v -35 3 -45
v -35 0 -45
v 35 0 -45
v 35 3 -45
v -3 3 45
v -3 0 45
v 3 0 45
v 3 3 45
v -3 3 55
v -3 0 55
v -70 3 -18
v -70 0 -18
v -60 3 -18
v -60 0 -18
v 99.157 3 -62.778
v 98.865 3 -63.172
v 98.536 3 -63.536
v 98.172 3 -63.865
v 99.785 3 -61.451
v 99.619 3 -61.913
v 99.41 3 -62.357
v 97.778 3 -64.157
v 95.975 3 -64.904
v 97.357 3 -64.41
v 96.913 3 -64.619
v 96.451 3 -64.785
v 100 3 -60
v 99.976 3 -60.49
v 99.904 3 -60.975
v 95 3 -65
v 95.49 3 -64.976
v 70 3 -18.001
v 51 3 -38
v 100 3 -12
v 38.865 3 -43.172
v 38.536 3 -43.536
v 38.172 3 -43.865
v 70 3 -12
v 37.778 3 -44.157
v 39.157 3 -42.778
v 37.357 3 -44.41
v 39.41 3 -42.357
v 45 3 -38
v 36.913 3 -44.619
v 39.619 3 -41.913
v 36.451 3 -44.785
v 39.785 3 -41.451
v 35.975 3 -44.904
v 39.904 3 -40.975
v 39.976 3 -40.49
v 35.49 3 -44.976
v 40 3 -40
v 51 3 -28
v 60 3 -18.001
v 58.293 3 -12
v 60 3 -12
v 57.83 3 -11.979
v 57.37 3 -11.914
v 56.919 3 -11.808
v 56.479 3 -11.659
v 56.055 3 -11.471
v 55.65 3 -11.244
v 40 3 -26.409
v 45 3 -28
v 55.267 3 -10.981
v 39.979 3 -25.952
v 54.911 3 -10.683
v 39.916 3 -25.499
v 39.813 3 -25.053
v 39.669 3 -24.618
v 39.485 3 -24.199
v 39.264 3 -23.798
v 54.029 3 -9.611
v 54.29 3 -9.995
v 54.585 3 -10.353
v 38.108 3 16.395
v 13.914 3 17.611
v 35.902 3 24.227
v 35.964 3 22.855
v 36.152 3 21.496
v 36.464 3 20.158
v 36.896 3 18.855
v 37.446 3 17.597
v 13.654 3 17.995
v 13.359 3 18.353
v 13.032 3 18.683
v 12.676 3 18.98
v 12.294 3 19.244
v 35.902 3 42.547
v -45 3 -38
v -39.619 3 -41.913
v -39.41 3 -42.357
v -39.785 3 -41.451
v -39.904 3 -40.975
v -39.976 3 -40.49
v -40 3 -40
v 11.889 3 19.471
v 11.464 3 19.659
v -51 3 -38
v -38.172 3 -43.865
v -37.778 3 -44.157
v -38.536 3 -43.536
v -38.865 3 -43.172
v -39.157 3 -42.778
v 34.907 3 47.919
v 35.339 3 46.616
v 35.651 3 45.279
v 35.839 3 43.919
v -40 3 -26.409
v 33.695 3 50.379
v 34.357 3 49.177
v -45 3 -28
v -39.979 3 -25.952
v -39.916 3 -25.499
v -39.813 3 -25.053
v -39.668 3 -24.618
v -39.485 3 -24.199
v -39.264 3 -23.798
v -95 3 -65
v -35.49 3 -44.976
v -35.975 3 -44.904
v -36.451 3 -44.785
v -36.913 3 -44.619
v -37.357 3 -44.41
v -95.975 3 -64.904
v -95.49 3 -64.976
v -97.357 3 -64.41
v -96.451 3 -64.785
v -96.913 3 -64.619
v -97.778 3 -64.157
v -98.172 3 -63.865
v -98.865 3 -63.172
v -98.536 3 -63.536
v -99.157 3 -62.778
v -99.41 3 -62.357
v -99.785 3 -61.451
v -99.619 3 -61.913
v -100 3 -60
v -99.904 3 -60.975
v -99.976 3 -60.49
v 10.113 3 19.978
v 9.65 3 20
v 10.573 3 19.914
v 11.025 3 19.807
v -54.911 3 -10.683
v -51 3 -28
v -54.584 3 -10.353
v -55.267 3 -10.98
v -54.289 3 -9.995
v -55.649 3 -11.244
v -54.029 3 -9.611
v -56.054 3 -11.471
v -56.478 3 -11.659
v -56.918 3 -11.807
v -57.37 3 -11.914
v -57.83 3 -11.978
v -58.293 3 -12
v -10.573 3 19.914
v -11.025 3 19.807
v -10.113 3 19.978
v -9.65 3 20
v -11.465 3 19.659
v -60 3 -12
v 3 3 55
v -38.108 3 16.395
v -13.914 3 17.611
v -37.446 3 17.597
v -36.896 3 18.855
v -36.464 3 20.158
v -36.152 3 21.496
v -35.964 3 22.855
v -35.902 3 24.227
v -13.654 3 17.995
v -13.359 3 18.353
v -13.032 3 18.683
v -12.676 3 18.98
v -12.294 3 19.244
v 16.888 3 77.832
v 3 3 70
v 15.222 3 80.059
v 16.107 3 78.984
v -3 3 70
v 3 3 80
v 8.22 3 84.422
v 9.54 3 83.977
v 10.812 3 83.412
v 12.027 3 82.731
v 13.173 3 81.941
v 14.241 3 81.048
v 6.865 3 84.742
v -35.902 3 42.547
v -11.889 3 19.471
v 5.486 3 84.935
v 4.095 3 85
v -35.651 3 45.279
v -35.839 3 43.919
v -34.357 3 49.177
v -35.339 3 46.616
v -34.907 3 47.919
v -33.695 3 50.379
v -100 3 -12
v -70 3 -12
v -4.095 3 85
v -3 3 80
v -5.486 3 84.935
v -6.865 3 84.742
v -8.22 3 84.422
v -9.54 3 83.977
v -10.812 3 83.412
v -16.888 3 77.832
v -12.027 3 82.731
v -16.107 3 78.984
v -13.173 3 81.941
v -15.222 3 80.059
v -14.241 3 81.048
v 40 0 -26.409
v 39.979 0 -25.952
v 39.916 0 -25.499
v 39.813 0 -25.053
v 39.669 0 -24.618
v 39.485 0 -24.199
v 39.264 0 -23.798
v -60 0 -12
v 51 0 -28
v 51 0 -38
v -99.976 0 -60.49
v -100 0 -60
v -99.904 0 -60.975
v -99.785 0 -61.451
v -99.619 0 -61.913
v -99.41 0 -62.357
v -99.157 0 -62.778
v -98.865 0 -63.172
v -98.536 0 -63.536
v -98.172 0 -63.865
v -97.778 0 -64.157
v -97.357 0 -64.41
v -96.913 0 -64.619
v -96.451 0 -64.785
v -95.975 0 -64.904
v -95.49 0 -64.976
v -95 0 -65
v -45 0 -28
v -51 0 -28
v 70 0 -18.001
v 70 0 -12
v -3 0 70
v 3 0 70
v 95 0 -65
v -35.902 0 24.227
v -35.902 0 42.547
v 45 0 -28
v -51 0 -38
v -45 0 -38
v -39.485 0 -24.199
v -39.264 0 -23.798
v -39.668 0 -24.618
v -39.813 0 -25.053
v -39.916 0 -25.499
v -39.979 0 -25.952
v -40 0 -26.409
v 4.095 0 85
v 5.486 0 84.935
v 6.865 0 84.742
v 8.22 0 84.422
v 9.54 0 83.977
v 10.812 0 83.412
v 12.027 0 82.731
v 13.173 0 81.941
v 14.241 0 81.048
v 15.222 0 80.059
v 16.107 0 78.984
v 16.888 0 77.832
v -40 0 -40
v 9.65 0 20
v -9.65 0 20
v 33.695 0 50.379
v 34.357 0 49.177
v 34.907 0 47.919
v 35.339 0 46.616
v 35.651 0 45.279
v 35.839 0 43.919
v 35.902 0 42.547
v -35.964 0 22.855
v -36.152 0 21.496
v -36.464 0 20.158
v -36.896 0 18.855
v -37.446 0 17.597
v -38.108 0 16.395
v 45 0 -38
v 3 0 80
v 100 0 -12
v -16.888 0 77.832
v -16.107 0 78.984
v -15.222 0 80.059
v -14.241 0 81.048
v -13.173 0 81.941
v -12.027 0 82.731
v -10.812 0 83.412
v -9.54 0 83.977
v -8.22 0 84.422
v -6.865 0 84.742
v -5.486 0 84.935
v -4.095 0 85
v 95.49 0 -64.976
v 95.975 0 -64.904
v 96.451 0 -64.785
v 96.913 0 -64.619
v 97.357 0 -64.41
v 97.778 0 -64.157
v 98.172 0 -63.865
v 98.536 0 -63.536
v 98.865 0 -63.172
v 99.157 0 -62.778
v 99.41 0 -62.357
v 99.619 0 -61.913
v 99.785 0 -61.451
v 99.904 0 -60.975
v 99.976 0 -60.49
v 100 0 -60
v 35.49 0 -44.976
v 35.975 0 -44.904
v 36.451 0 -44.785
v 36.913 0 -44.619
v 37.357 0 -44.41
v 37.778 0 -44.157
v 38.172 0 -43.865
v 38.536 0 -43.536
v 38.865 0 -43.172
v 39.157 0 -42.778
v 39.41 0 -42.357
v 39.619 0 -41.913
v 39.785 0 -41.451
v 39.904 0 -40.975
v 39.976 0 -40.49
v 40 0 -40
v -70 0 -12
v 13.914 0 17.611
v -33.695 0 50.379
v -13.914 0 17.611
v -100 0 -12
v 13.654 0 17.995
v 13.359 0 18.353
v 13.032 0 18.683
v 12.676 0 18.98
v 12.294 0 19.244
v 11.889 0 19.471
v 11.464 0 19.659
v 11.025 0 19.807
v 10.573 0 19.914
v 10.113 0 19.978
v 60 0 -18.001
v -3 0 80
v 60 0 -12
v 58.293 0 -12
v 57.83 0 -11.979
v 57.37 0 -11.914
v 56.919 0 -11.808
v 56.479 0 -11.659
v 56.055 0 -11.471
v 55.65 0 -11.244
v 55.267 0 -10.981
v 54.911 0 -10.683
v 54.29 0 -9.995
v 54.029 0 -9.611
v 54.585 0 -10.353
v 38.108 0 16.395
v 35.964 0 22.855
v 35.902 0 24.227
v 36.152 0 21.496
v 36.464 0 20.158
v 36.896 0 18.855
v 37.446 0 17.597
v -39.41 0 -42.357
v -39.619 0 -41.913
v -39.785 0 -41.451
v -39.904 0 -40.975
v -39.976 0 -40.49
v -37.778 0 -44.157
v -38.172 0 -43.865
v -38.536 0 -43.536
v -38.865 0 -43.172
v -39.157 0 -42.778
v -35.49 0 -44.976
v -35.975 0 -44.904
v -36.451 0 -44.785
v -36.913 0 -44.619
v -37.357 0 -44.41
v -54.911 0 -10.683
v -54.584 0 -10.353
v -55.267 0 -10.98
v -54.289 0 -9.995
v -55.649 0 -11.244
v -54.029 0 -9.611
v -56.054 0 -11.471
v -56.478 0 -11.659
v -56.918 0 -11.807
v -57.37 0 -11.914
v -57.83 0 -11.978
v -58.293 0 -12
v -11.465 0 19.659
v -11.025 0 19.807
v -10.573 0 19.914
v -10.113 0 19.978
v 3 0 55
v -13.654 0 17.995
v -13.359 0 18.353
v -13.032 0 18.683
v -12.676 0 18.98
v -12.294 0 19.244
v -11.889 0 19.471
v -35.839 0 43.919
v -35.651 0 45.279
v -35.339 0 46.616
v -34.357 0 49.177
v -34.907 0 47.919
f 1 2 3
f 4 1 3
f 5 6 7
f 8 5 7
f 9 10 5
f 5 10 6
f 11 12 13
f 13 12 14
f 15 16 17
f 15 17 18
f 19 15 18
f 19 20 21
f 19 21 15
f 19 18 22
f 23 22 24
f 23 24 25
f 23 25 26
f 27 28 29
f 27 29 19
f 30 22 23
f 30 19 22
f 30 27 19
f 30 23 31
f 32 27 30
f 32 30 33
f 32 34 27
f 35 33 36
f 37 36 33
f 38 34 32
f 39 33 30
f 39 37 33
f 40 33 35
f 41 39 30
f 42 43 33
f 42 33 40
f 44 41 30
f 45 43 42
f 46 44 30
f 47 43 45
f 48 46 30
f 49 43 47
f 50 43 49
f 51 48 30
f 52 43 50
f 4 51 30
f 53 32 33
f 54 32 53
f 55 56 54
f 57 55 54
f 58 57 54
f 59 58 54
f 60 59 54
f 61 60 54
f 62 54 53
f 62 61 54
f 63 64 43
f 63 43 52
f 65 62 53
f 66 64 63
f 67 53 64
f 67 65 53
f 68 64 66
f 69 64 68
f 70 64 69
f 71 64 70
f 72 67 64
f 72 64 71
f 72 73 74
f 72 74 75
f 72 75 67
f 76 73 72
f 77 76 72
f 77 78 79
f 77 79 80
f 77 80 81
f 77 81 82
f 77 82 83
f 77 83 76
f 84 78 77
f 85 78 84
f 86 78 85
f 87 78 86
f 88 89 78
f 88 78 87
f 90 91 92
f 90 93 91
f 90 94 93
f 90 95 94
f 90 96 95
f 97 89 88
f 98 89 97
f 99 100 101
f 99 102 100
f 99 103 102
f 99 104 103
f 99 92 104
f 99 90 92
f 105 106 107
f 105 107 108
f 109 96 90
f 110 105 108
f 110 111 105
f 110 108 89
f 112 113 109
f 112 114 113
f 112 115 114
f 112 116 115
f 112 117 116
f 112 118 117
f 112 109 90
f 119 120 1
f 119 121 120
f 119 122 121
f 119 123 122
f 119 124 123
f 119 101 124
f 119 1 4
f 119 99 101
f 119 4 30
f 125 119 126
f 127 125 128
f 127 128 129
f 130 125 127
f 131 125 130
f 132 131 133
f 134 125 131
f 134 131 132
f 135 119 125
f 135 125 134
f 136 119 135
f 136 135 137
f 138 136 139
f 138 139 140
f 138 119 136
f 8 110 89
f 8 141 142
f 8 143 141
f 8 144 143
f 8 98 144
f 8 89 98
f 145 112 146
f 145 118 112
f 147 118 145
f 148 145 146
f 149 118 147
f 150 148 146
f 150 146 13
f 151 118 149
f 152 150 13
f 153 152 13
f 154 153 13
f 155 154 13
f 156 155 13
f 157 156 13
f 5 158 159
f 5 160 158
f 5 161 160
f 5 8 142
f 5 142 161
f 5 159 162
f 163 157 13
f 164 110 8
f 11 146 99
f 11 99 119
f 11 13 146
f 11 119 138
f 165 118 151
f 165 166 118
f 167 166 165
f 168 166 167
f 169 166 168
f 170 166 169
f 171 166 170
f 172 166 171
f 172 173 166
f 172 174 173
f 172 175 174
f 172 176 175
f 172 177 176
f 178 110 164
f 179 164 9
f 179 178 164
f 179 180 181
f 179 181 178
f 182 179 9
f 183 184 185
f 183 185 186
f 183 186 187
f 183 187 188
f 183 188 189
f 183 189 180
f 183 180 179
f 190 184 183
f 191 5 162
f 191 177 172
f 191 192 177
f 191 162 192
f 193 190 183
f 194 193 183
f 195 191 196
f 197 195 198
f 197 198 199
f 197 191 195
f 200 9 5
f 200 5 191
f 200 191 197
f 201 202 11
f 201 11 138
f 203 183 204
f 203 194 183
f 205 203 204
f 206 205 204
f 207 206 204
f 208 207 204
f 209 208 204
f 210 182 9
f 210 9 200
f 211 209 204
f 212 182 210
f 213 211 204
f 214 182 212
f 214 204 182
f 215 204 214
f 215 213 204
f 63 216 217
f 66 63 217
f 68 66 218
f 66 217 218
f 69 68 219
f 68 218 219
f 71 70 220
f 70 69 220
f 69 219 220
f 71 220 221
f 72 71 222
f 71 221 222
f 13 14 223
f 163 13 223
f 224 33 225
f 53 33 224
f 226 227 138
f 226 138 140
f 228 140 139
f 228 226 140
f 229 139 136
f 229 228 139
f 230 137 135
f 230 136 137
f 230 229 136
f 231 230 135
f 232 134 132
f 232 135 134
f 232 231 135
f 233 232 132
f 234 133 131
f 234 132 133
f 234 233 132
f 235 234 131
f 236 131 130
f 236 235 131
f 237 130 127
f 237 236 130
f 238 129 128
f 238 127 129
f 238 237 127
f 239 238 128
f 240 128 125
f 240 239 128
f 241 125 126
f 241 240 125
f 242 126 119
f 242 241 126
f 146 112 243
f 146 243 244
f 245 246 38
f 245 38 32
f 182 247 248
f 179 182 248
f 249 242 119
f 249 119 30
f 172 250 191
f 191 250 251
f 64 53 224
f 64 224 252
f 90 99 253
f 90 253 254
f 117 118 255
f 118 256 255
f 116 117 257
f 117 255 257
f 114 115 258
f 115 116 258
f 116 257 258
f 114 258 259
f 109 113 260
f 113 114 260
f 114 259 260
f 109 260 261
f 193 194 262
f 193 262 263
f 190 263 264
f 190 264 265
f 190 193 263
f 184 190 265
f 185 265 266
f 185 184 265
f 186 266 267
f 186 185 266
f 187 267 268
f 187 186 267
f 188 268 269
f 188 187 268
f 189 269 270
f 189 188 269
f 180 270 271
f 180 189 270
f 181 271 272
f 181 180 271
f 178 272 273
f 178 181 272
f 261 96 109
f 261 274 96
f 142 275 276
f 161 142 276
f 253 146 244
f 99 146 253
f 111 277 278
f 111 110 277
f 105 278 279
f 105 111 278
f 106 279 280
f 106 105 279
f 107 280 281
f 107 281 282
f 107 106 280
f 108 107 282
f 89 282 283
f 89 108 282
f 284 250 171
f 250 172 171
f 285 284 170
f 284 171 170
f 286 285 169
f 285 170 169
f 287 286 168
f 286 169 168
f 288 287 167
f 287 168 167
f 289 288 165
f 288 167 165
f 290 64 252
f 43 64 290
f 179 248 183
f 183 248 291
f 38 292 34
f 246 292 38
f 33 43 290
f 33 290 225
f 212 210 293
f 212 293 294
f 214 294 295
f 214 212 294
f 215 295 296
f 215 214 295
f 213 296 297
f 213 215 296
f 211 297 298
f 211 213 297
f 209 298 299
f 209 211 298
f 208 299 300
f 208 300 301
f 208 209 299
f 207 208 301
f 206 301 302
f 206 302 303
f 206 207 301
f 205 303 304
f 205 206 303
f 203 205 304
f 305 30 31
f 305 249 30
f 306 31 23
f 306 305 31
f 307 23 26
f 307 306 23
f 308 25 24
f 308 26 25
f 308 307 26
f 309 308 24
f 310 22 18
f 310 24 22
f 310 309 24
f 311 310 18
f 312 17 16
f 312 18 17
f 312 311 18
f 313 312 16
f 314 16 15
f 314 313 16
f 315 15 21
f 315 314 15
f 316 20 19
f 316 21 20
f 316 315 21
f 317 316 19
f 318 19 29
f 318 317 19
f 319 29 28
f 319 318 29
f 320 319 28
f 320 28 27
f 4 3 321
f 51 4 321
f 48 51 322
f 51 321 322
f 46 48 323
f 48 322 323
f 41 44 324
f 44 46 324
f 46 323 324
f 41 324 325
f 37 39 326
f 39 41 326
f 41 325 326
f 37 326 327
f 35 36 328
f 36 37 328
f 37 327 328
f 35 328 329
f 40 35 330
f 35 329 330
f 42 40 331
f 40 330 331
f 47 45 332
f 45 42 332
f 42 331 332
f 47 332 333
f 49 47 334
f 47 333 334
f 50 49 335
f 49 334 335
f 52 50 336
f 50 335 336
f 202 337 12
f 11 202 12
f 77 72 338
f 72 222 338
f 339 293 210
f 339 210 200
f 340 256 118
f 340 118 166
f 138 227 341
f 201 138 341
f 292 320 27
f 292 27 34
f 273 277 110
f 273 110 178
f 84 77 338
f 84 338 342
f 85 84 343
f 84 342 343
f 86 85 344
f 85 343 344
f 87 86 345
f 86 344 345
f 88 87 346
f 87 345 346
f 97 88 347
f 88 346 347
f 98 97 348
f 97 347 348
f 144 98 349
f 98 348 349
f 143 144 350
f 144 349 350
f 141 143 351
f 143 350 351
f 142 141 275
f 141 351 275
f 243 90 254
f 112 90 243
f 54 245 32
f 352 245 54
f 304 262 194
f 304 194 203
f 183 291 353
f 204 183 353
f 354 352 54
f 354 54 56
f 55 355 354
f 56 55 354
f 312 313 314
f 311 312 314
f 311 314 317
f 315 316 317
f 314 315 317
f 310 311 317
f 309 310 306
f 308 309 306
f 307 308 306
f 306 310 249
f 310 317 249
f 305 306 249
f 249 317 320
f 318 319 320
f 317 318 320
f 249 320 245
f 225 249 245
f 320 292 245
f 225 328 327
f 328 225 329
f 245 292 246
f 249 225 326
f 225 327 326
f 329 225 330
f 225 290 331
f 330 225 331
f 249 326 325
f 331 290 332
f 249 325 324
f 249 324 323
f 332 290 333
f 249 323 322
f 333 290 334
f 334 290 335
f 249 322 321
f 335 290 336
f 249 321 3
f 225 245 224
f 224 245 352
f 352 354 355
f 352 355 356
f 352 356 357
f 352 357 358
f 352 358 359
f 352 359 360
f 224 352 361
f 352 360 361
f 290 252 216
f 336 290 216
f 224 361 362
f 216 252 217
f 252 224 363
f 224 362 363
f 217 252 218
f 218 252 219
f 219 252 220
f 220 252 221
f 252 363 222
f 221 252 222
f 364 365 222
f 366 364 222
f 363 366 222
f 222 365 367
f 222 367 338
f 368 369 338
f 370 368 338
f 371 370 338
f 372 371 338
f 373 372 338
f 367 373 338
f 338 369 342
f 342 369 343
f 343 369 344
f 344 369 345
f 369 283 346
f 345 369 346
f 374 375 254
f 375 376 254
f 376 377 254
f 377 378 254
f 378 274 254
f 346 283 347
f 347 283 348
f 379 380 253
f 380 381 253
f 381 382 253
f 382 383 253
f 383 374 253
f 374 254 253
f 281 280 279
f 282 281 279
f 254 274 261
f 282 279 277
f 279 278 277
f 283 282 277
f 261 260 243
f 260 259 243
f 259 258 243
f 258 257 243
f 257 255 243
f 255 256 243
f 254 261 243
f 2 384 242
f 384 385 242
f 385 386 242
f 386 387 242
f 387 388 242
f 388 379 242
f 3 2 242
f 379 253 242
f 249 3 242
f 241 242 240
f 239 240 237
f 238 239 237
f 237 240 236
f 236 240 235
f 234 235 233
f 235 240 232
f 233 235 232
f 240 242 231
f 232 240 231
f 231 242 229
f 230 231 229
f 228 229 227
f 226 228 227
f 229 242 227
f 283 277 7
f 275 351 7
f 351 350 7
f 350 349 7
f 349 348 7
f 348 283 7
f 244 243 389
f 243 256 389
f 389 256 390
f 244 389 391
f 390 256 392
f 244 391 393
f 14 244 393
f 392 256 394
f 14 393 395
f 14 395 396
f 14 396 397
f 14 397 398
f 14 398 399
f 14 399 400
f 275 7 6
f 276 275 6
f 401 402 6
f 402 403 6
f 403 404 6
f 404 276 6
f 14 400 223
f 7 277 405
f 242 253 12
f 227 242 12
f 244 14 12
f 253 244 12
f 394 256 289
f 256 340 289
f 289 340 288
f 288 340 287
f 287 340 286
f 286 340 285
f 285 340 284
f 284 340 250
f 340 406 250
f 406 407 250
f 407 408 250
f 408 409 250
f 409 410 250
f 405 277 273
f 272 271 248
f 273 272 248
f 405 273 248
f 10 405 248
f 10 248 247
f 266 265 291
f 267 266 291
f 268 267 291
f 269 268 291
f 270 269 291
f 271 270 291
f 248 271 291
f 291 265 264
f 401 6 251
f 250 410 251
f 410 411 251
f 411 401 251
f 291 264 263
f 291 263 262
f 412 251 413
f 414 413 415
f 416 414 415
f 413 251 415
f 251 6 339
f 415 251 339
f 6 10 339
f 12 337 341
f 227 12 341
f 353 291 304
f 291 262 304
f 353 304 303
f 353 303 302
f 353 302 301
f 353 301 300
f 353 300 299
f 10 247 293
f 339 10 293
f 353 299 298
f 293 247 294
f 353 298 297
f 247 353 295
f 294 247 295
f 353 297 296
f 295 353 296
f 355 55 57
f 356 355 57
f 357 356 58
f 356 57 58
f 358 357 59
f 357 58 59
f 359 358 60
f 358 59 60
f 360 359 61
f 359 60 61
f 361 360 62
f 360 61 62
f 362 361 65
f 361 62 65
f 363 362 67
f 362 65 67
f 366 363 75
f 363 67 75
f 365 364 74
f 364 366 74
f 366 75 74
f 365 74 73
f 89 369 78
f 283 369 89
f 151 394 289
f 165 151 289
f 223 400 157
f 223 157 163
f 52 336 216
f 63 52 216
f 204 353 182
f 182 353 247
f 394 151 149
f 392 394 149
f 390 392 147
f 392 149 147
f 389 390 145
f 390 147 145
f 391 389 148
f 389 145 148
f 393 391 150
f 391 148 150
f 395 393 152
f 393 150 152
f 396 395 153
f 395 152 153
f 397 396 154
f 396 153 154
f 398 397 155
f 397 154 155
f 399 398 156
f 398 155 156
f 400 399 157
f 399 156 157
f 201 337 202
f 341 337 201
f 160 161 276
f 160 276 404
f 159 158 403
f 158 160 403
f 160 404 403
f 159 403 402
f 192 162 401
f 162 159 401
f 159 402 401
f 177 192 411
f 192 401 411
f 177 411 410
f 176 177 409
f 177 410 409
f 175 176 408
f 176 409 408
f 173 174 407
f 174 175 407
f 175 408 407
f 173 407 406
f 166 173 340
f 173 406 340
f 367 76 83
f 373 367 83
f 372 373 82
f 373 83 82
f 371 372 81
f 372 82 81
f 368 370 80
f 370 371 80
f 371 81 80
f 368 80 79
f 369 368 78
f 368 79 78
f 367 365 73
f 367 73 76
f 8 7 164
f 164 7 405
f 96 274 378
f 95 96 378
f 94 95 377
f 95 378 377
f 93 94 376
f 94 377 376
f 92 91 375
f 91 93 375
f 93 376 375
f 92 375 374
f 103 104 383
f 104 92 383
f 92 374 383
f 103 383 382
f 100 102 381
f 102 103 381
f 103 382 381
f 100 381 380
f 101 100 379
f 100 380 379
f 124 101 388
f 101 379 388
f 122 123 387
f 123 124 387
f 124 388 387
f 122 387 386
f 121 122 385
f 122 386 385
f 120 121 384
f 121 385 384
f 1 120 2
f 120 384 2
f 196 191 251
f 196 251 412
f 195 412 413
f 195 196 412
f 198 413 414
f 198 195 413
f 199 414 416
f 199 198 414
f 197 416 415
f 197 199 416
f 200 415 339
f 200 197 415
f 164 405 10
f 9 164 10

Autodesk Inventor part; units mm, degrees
ref_plane "YZ Plane" through (0, 0, 0) normal (1, 0, 0) x (0, 1, 0)
ref_plane "XZ Plane" through (0, 0, 0) normal (0, 1, 0) x (-1, 0, 0)
ref_plane "XY Plane" through (0, 0, 0) normal (0, 0, 1) x (1, 0, 0)
sketch "Sketch2" plane through (0, 0, 0) normal (0, 1, 0) x (-1, 0, 0)
  line L0 (70, -18) -> (60, -18)
  line L1 (60, -18) -> (60, -12)
  line L2 (70, -12) -> (70, -18)
  line L3 (-70, -18.0006) -> (-60, -18.0006)
  line L4 (-60, -18.0006) -> (-60, -12.0003)
  line L5 (-70, -12.0003) -> (-70, -18.0006)
  line L6 (3, 70) -> (-3, 70)
  line L7 (-3, 70) -> (-3, 80)
  line L8 (-3, 80) -> (3, 80)
  line L9 (3, 80) -> (3, 70)
  line L10 (3, 45) -> (-3, 45)
  line L11 (-3, 45) -> (-3, 55)
  line L12 (-3, 55) -> (3, 55)
  line L13 (3, 55) -> (3, 45)
  line L14 (95, -65) -> (-95, -65)
  line L15 (-12.5, 85) -> (12.5, 85)
  line L16 (12.5, 85) -> (35.9015, 46.7742)
  line L17 (-100, -12.0003) -> (-70, -12.0003)
  line L18 (-55.4919, -12.0003) -> (-60, -12.0003)
  line L19 (55.4917, -12) -> (60, -12)
  line L20 (70, -12) -> (100, -12)
  line L21 (-100, -60) -> (-100, -12.0003)
  line L22 (100, -60) -> (100, -12)
  line L23 (35, -45) -> (-35, -45)
  line L24 (-40, -40) -> (-40, -26.409)
  line L25 (-39.2644, -23.7983) -> (-13.9141, 17.6106)
  line L26 (-9.6497, 20) -> (9.6497, 20)
  line L27 (40, -40) -> (40, -26.409)
  line L28 (39.2644, -23.7983) -> (13.9141, 17.6106)
  arc A0 (-40, -40) -> (-35, -45) centre (-35, -40) ccw
  arc A1 (-39.2644, -23.7983) -> (-40, -26.409) centre (-35, -26.409) ccw
  arc A2 (-9.6497, 20) -> (-13.9141, 17.6106) centre (-9.6497, 15) ccw
  arc A3 (13.9141, 17.6106) -> (9.6497, 20) centre (9.6497, 15) ccw
  arc A4 (40, -26.409) -> (39.2644, -23.7983) centre (35, -26.409) ccw
  arc A5 (35, -45) -> (40, -40) centre (35, -40) ccw
  line L29 (55.4917, -12) -> (35.9015, 20)
  line L30 (35.9015, 20) -> (35.9015, 46.7742)
  line L31 (-55.4919, -12.0003) -> (-35.9015, 20)
  line L32 (-35.9015, 20) -> (-35.9015, 46.7742)
  line L33 (-35.9015, 46.7742) -> (-12.5, 85)
  line L34 (0, -65) -> (0, 85) construction
  arc A6 (95, -65) -> (100, -60) centre (95, -60) ccw
  arc A7 (-100, -60) -> (-95, -65) centre (-95, -60) ccw
  point P0 (100, -65)
  point P1 (-100, -65)
  point P2 (0, 0)
  point P3 (0, 80)
  point P4 (0, 45)
  point P5 (0, 55)
  point P6 (0, 0)
  point P7 (0, 0)
  point P8 (-70, -15.4178)
  point P9 (75.3708, -12)
  point P10 (0, 0)
  point P11 (-40, -45)
  point P12 (40, -45)
  point P13 (-40, -25)
  point P14 (-12.4513, 20)
  point P15 (12.4513, 20)
  point P16 (40, -25)
  point P17 (0, 20)
  point P18 (0, -45)
  dimension "d65" = 200
  dimension "d115" = 10
  dimension "d116" = 6
  dimension "d118" = 10
  dimension "d119" = 6
  dimension "d120" = 15
  dimension "d147" = 65
  dimension "d173" = 25
  dimension "d187" = 100
  dimension "d191" = 30
  dimension "d192" = 30
  dimension "d194" = 6.0003
  dimension "d195" = 6
  dimension "d196" = 10
  dimension "d197" = 10
  dimension "d198" = 52.9997
  dimension "d199" = 53
  dimension "d204" = 150
  dimension "d213" = 20
  dimension "d214" = 20
  dimension "d218" = 65
  dimension "d219" = 40
  dimension "d220" = 5
  dimension "d233" = 148.525
  dimension "d235" = 5
  dimension "d236" = 20
  dimension "d249" = 5
extrude "Extrusion11" add sketch "Sketch2" along normal blind 3
sketch "Sketch4" plane through (0, 3, 0) normal (0, 1, 0) x (1, 0, 0)
  line L0 (-51, 38) -> (-45, 38)
  line L1 (-45, 38) -> (-45, 28)
  line L2 (-45, 28) -> (-51, 28)
  line L3 (-51, 28) -> (-51, 38)
  line L4 (95, 65) -> (-95, 65) projected
  line L5 (-40, 40) -> (-40, 26.409) projected
  line L6 (45, 38) -> (51, 38)
  line L7 (51, 38) -> (51, 28)
  line L8 (51, 28) -> (45, 28)
  line L9 (45, 28) -> (45, 38)
  line L10 (40, 40) -> (40, 26.409) projected
  point P0 (0, 0)
  point P1 (100, 65)
  point P2 (-100, 65)
  dimension "d237" = 6
  dimension "d238" = 27
  dimension "d239" = 10
  dimension "d240" = 5
  dimension "d241" = 6
  dimension "d242" = 10
  dimension "d243" = 5
  dimension "d244" = 27
extrude "Extrusion13" cut sketch "Sketch4" against normal through all
fillet "Fillet1" radius 15 6 edges at (12.5, 1.5, 85) (-12.5, 1.5, 85) (-35.9015, 1.5, 46.7742) (35.9015, 1.5, 46.7742) (35.9015, 1.5, 20) (-35.9015, 1.5, 20)
fillet "Fillet2" radius 5 2 edges at (55.4919, 1.5, -12.0003) (-55.4917, 1.5, -12)
properties part number "Top Plate 27100914"
